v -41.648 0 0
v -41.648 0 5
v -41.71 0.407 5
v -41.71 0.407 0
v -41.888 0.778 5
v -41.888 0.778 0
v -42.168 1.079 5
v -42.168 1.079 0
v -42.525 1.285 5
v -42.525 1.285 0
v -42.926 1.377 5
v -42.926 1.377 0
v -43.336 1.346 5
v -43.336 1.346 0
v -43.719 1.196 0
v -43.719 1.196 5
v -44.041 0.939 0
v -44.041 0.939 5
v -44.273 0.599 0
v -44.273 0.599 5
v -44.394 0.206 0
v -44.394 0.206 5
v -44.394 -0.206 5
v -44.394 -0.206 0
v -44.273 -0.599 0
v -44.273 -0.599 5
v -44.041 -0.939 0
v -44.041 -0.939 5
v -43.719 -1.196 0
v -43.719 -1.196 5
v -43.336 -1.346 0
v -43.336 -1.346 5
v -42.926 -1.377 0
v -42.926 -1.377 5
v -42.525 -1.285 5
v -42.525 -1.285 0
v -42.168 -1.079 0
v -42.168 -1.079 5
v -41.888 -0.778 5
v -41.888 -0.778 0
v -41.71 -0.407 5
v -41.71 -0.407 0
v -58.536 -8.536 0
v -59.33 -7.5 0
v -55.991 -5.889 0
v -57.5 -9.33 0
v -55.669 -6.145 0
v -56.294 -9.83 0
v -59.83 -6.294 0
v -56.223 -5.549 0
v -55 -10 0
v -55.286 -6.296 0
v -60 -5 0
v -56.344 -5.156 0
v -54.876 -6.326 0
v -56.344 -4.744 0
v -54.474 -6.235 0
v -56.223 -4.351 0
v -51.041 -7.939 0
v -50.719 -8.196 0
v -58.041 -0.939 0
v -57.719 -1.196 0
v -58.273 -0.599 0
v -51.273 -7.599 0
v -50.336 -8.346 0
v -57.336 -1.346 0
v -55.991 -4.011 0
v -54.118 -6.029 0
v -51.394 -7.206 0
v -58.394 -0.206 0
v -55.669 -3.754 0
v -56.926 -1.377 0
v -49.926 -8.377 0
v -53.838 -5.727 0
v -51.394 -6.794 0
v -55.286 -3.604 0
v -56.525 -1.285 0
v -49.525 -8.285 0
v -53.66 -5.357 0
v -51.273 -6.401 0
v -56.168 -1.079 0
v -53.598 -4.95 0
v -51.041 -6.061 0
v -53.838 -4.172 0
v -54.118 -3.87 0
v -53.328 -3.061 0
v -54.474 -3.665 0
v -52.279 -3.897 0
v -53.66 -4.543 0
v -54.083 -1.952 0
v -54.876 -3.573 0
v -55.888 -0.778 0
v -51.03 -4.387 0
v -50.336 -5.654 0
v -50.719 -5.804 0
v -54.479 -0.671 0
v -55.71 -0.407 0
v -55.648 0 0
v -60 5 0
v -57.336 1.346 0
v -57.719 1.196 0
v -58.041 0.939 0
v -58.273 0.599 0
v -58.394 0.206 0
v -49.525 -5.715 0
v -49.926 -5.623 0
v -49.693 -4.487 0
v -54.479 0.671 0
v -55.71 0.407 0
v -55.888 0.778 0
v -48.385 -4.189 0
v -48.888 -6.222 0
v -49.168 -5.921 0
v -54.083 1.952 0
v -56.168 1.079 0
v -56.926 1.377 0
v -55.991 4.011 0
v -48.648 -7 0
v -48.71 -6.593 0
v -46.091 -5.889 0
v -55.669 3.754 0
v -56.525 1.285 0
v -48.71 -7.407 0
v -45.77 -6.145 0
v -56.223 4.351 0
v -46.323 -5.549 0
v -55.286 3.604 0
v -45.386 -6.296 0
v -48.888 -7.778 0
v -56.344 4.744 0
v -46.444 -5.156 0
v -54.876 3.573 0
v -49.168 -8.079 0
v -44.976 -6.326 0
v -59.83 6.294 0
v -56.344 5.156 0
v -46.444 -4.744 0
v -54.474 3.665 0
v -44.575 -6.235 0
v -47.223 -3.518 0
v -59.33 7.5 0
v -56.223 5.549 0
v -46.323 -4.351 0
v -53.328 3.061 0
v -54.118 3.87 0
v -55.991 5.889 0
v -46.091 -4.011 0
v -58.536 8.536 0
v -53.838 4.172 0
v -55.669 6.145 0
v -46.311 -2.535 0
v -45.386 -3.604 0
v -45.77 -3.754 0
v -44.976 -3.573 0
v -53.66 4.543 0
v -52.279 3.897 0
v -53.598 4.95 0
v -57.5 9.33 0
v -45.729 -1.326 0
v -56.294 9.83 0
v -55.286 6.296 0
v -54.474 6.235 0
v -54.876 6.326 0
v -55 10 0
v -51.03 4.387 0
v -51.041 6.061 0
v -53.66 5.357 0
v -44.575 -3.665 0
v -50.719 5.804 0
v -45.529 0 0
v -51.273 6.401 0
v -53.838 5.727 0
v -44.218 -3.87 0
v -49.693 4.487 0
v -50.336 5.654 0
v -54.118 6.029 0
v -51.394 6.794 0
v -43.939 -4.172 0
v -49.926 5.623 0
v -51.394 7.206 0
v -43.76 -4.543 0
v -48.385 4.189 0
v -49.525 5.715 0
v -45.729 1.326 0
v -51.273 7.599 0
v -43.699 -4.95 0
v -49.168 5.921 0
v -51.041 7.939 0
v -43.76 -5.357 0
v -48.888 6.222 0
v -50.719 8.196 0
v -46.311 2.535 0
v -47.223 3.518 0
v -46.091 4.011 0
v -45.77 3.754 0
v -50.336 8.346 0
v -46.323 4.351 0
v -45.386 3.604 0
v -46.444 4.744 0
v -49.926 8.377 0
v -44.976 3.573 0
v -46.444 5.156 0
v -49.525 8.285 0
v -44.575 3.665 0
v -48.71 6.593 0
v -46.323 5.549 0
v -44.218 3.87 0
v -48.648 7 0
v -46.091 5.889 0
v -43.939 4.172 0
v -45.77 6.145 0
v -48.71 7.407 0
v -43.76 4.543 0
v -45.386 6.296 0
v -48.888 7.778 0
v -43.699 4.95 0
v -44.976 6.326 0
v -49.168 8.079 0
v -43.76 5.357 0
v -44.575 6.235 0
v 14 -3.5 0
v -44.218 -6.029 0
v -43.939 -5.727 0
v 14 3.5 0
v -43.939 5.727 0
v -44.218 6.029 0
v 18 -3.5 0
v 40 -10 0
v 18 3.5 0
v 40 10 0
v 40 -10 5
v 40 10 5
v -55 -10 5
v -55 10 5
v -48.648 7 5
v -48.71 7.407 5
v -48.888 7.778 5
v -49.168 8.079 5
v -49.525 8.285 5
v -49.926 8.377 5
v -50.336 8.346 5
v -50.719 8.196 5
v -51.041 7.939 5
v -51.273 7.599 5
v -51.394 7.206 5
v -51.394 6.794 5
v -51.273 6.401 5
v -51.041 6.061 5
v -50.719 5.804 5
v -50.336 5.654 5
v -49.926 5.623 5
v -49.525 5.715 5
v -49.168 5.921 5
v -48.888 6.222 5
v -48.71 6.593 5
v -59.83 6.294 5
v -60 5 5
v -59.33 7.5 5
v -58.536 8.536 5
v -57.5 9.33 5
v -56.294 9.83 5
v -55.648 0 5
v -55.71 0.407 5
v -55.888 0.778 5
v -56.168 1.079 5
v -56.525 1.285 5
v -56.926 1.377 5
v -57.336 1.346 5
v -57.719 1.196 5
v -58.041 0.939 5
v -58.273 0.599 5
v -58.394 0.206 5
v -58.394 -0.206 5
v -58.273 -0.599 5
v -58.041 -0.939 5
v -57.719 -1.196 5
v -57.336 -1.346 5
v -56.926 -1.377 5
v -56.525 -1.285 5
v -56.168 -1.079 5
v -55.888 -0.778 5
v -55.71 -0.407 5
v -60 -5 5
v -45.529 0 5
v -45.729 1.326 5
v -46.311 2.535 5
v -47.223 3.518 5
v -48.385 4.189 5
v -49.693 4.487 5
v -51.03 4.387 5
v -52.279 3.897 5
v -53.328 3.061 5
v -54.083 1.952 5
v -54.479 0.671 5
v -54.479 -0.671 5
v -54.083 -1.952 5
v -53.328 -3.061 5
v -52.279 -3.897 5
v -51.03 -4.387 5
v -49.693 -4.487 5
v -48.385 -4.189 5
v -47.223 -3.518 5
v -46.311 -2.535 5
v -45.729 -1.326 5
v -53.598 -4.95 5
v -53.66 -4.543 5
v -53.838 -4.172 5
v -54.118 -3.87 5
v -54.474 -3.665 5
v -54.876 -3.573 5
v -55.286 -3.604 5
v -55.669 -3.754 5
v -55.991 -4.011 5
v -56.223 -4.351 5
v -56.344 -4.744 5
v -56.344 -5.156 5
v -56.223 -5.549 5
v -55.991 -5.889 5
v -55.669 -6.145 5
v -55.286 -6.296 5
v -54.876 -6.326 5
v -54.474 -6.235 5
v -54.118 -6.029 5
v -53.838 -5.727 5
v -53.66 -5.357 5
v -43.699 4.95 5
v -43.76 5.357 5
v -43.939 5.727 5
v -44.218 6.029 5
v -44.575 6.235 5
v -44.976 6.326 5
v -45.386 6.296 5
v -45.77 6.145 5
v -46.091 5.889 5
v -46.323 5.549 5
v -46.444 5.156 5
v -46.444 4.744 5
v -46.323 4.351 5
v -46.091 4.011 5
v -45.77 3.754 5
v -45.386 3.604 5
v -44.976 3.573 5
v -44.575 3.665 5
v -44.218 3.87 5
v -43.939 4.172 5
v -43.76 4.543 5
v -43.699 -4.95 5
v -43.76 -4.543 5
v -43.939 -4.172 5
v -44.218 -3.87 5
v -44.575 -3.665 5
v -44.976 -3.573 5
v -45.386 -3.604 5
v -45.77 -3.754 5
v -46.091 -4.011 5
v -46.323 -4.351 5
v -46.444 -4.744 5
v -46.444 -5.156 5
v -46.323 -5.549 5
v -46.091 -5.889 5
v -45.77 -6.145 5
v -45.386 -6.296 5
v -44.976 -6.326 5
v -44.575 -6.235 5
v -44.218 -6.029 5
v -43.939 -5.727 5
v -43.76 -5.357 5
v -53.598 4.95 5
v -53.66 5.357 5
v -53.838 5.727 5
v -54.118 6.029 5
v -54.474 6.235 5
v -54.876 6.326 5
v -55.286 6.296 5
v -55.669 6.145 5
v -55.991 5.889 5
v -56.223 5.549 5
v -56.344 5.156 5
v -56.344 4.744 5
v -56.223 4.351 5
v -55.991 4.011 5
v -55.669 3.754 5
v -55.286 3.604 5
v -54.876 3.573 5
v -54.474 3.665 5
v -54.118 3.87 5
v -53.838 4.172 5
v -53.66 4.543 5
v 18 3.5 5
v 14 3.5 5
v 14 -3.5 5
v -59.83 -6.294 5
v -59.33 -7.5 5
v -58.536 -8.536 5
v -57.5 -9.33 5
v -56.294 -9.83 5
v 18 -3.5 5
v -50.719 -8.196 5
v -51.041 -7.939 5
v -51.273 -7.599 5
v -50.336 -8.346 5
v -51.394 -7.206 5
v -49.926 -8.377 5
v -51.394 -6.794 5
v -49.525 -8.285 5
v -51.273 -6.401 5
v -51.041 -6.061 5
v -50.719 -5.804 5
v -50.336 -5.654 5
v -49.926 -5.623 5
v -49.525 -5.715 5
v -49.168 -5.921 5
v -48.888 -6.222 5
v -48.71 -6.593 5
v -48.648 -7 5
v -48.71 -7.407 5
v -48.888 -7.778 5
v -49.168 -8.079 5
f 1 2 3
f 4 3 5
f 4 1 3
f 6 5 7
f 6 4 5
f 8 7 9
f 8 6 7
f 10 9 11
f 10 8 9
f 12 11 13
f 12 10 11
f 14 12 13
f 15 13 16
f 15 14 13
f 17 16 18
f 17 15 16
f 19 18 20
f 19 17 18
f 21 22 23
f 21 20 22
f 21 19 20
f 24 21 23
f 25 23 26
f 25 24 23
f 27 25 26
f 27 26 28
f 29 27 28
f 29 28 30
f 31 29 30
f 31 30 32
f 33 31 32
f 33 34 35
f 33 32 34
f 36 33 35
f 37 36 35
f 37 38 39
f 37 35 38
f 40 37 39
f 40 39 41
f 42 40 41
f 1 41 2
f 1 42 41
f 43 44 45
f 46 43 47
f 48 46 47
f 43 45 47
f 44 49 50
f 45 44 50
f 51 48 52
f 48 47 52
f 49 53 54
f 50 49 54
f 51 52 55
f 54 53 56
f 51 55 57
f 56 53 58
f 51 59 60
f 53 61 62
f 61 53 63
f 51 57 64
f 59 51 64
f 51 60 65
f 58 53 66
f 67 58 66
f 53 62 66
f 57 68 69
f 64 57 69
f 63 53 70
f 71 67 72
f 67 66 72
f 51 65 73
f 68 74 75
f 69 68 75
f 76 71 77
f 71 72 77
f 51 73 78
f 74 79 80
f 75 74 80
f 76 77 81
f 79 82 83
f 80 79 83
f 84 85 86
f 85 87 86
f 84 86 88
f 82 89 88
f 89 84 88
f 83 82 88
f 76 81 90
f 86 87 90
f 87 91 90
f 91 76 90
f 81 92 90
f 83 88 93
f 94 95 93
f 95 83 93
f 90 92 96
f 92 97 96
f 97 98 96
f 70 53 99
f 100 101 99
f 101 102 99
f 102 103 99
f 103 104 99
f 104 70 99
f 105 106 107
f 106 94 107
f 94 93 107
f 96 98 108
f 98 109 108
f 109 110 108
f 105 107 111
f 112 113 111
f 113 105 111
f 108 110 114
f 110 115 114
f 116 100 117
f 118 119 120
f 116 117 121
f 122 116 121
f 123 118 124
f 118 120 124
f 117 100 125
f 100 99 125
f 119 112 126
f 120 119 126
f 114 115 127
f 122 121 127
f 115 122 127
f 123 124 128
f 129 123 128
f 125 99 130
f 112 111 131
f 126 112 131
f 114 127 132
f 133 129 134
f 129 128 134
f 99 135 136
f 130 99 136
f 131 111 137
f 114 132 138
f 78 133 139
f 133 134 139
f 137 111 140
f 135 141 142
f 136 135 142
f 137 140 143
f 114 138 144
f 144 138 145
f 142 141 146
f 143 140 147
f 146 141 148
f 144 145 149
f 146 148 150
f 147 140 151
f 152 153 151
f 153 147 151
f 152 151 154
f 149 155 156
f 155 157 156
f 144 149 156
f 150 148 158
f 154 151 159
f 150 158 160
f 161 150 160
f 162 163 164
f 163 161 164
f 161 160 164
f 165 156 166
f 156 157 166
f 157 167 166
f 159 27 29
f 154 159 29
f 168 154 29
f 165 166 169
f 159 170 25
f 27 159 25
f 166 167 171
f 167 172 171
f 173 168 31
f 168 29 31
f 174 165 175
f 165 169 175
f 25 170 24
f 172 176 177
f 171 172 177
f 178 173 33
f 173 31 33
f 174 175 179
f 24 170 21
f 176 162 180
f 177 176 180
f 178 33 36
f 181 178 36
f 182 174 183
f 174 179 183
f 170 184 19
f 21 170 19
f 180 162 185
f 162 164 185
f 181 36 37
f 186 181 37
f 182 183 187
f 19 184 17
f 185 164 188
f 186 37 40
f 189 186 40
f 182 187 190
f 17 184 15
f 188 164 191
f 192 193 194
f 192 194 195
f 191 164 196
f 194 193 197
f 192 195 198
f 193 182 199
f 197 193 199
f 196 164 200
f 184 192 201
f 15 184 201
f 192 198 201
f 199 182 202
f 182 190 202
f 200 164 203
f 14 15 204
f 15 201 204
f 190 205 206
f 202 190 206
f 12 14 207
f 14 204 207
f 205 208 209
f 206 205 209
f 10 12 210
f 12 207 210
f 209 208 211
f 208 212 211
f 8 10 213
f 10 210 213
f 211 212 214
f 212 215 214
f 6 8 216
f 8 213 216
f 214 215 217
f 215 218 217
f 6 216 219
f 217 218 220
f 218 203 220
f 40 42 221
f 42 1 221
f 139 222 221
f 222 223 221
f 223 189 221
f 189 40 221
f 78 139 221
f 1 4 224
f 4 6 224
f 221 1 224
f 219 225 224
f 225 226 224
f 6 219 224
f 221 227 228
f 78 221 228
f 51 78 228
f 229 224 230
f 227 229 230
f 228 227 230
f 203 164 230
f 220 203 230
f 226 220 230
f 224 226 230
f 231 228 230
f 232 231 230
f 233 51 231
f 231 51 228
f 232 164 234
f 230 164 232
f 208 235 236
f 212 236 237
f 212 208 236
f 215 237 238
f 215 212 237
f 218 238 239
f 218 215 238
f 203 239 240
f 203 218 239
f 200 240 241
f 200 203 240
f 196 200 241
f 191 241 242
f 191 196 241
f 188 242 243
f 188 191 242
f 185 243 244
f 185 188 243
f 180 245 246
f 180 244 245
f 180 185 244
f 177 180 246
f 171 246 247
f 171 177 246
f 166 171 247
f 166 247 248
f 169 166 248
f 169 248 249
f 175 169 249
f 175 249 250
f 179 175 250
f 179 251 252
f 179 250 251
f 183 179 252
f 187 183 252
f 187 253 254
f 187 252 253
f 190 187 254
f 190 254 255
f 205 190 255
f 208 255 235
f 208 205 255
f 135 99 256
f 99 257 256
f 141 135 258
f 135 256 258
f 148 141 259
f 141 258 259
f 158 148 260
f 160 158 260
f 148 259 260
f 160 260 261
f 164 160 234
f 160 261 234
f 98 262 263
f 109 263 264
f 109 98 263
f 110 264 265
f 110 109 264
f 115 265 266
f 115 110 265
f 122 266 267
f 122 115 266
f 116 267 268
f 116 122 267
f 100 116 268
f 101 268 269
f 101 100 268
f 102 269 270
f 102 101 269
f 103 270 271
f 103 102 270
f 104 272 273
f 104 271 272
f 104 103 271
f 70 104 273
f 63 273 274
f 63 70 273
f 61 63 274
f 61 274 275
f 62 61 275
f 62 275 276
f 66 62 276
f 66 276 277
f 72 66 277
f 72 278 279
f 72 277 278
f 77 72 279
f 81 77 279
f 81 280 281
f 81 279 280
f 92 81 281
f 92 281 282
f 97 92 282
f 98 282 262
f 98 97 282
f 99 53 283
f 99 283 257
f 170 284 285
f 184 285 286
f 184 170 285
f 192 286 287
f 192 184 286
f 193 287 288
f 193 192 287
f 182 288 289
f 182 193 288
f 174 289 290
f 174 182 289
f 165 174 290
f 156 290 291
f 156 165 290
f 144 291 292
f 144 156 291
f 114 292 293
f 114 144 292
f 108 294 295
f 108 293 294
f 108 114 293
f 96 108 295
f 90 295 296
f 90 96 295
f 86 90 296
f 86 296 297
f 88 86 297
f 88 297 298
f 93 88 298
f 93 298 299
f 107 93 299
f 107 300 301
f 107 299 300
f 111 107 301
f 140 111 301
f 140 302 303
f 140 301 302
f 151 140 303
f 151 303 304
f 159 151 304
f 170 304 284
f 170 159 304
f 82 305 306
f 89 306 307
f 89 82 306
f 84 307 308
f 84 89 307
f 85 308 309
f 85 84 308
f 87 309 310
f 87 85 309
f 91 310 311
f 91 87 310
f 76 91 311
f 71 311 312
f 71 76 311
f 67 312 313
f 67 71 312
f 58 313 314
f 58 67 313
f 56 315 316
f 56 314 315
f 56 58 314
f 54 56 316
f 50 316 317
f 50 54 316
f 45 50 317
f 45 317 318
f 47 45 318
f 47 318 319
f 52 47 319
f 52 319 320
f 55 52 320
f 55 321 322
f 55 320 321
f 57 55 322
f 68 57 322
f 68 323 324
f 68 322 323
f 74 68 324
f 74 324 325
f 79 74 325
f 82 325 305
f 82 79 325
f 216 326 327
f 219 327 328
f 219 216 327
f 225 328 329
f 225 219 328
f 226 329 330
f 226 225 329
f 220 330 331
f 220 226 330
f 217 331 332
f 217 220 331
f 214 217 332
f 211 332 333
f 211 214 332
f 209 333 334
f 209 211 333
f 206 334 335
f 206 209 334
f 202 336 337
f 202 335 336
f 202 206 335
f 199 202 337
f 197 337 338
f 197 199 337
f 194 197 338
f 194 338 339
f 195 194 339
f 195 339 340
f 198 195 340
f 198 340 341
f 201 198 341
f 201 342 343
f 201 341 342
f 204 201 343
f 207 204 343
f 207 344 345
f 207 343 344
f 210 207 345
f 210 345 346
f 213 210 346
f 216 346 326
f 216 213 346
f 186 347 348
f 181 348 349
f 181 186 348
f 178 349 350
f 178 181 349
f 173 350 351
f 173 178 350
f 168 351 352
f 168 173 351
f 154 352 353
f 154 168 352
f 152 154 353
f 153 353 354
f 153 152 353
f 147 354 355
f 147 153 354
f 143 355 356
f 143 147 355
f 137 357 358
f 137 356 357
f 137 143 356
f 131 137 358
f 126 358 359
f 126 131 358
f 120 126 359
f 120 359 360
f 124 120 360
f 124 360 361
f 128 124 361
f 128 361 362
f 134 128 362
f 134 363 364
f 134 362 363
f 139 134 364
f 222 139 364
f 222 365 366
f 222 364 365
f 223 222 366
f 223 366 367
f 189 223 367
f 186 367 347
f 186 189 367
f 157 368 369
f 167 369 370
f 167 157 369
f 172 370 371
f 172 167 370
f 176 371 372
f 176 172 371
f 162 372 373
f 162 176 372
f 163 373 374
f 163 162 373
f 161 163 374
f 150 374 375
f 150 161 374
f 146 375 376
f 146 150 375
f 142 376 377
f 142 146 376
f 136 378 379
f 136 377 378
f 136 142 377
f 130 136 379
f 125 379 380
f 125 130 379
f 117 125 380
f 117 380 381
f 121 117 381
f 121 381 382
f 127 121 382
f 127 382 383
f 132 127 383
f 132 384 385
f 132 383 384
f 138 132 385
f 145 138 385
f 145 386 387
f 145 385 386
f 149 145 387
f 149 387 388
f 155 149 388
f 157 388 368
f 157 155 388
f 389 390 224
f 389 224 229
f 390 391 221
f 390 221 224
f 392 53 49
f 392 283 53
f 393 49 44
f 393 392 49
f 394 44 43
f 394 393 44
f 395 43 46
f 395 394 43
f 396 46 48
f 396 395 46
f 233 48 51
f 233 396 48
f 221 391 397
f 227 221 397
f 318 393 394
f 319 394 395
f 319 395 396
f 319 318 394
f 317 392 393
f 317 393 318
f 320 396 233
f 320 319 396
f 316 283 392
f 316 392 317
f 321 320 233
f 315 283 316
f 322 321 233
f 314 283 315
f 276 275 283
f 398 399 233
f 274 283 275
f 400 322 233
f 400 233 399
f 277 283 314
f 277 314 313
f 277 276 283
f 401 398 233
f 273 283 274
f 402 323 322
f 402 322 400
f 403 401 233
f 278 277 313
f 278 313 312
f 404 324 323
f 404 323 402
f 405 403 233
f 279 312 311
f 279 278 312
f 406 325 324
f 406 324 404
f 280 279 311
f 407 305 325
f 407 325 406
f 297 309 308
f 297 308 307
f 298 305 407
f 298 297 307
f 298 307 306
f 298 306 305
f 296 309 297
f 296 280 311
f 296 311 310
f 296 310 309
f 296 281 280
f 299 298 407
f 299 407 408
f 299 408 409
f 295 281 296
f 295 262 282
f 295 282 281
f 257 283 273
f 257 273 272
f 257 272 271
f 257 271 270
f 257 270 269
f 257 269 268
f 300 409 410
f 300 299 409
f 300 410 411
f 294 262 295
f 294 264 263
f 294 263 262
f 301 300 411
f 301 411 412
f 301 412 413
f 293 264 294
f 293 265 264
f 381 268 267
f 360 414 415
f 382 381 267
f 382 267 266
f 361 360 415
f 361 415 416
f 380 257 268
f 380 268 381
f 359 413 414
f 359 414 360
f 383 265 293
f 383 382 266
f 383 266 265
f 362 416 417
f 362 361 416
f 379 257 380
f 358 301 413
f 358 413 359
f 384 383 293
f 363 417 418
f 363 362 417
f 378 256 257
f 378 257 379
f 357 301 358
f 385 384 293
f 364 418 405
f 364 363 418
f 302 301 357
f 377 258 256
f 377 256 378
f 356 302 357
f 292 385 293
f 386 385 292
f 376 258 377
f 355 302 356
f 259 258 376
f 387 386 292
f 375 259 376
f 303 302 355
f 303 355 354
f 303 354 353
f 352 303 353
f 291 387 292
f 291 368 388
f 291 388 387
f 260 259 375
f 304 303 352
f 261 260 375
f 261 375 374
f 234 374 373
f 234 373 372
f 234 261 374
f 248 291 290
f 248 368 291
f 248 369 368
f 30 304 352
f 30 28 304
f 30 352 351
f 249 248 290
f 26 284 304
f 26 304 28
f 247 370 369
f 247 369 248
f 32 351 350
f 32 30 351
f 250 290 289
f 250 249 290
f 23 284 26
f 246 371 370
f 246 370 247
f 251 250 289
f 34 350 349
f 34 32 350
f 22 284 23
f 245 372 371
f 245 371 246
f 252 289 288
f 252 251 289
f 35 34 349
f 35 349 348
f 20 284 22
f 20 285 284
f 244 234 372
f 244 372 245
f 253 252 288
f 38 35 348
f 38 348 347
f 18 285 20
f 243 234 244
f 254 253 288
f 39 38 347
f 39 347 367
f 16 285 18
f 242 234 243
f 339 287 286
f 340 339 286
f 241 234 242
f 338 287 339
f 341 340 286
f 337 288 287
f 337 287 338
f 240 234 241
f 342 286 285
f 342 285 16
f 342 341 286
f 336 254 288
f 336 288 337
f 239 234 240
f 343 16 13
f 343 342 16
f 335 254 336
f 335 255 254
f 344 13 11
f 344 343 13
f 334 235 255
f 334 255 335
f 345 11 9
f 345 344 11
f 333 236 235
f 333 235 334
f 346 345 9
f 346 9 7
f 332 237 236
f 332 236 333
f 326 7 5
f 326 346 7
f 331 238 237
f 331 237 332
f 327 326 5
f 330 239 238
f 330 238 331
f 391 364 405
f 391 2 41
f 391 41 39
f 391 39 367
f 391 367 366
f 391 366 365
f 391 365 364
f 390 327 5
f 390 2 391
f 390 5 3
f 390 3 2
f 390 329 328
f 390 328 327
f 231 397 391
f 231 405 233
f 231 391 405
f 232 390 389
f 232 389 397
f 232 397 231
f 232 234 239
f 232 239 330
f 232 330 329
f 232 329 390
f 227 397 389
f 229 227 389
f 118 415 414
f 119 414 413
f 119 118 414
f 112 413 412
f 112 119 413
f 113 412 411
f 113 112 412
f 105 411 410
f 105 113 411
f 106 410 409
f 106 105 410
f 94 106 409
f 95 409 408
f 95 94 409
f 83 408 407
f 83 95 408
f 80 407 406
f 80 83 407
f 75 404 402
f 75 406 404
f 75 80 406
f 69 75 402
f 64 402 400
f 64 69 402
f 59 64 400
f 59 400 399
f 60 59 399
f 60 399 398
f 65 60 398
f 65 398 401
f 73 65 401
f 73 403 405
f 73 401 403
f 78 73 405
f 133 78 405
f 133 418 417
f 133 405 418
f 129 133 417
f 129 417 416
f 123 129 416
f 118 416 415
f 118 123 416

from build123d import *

# Parameters (mm, degrees)
SKETCH1_W           = 120
SKETCH1_H           = 20
BOSS_EXTRUDE1_DEPTH = 5
FILLET1_R           = 5
SKETCH3_R           = 4.5
SKETCH3_R_2         = 1.3805661
CUT_EXTRUDE2_DEPTH  = 17
SKETCH4_W           = 20
SKETCH4_H           = 20
CUT_EXTRUDE3_DEPTH  = 20
SKETCH6_W           = 4
SKETCH6_H           = 7
CUT_EXTRUDE4_DEPTH  = 20


with BuildPart() as part:
    # Sketch1 → Boss-Extrude1 (new body)
    with BuildSketch(Plane.XY):
        Rectangle(SKETCH1_W, SKETCH1_H)
    extrude(amount=BOSS_EXTRUDE1_DEPTH)

    # Fillet1
    fillet1_edges = [part.edges().sort_by_distance(p)[0] for p in [
        (-60, -10, 2.5),
        (-60, 10, 2.5),
    ]]
    fillet(fillet1_edges, radius=FILLET1_R)

    # Sketch3 → Cut-Extrude2 (cut)
    with BuildSketch(Plane.XY):
        with Locations((-50.02901078, 0)):
            Circle(SKETCH3_R)
        with Locations((-50.02901078, 7)):
            Circle(SKETCH3_R_2)
        with Locations((-45.079263311, 4.949747468)):
            Circle(SKETCH3_R_2)
        with Locations((-43.02901078, 0)):
            Circle(SKETCH3_R_2)
        with Locations((-45.079263311, -4.949747468)):
            Circle(SKETCH3_R_2)
        with Locations((-50.02901078, -7)):
            Circle(SKETCH3_R_2)
        with Locations((-54.978758248, -4.949747468)):
            Circle(SKETCH3_R_2)
        with Locations((-57.02901078, 0)):
            Circle(SKETCH3_R_2)
        with Locations((-54.978758248, 4.949747468)):
            Circle(SKETCH3_R_2)
    extrude(amount=CUT_EXTRUDE2_DEPTH, mode=Mode.SUBTRACT)

    # Sketch4 → Cut-Extrude3 (cut)
    with BuildSketch(Plane.XY):
        with Locations((50, 0)):
            Rectangle(SKETCH4_W, SKETCH4_H)
    extrude(amount=CUT_EXTRUDE3_DEPTH, mode=Mode.SUBTRACT)

    # Sketch6 → Cut-Extrude4 (cut)
    with BuildSketch(Plane.XY.offset(5)):
        with Locations((16, 0)):
            Rectangle(SKETCH6_W, SKETCH6_H)
    extrude(amount=-CUT_EXTRUDE4_DEPTH, mode=Mode.SUBTRACT)


solid = part.part
